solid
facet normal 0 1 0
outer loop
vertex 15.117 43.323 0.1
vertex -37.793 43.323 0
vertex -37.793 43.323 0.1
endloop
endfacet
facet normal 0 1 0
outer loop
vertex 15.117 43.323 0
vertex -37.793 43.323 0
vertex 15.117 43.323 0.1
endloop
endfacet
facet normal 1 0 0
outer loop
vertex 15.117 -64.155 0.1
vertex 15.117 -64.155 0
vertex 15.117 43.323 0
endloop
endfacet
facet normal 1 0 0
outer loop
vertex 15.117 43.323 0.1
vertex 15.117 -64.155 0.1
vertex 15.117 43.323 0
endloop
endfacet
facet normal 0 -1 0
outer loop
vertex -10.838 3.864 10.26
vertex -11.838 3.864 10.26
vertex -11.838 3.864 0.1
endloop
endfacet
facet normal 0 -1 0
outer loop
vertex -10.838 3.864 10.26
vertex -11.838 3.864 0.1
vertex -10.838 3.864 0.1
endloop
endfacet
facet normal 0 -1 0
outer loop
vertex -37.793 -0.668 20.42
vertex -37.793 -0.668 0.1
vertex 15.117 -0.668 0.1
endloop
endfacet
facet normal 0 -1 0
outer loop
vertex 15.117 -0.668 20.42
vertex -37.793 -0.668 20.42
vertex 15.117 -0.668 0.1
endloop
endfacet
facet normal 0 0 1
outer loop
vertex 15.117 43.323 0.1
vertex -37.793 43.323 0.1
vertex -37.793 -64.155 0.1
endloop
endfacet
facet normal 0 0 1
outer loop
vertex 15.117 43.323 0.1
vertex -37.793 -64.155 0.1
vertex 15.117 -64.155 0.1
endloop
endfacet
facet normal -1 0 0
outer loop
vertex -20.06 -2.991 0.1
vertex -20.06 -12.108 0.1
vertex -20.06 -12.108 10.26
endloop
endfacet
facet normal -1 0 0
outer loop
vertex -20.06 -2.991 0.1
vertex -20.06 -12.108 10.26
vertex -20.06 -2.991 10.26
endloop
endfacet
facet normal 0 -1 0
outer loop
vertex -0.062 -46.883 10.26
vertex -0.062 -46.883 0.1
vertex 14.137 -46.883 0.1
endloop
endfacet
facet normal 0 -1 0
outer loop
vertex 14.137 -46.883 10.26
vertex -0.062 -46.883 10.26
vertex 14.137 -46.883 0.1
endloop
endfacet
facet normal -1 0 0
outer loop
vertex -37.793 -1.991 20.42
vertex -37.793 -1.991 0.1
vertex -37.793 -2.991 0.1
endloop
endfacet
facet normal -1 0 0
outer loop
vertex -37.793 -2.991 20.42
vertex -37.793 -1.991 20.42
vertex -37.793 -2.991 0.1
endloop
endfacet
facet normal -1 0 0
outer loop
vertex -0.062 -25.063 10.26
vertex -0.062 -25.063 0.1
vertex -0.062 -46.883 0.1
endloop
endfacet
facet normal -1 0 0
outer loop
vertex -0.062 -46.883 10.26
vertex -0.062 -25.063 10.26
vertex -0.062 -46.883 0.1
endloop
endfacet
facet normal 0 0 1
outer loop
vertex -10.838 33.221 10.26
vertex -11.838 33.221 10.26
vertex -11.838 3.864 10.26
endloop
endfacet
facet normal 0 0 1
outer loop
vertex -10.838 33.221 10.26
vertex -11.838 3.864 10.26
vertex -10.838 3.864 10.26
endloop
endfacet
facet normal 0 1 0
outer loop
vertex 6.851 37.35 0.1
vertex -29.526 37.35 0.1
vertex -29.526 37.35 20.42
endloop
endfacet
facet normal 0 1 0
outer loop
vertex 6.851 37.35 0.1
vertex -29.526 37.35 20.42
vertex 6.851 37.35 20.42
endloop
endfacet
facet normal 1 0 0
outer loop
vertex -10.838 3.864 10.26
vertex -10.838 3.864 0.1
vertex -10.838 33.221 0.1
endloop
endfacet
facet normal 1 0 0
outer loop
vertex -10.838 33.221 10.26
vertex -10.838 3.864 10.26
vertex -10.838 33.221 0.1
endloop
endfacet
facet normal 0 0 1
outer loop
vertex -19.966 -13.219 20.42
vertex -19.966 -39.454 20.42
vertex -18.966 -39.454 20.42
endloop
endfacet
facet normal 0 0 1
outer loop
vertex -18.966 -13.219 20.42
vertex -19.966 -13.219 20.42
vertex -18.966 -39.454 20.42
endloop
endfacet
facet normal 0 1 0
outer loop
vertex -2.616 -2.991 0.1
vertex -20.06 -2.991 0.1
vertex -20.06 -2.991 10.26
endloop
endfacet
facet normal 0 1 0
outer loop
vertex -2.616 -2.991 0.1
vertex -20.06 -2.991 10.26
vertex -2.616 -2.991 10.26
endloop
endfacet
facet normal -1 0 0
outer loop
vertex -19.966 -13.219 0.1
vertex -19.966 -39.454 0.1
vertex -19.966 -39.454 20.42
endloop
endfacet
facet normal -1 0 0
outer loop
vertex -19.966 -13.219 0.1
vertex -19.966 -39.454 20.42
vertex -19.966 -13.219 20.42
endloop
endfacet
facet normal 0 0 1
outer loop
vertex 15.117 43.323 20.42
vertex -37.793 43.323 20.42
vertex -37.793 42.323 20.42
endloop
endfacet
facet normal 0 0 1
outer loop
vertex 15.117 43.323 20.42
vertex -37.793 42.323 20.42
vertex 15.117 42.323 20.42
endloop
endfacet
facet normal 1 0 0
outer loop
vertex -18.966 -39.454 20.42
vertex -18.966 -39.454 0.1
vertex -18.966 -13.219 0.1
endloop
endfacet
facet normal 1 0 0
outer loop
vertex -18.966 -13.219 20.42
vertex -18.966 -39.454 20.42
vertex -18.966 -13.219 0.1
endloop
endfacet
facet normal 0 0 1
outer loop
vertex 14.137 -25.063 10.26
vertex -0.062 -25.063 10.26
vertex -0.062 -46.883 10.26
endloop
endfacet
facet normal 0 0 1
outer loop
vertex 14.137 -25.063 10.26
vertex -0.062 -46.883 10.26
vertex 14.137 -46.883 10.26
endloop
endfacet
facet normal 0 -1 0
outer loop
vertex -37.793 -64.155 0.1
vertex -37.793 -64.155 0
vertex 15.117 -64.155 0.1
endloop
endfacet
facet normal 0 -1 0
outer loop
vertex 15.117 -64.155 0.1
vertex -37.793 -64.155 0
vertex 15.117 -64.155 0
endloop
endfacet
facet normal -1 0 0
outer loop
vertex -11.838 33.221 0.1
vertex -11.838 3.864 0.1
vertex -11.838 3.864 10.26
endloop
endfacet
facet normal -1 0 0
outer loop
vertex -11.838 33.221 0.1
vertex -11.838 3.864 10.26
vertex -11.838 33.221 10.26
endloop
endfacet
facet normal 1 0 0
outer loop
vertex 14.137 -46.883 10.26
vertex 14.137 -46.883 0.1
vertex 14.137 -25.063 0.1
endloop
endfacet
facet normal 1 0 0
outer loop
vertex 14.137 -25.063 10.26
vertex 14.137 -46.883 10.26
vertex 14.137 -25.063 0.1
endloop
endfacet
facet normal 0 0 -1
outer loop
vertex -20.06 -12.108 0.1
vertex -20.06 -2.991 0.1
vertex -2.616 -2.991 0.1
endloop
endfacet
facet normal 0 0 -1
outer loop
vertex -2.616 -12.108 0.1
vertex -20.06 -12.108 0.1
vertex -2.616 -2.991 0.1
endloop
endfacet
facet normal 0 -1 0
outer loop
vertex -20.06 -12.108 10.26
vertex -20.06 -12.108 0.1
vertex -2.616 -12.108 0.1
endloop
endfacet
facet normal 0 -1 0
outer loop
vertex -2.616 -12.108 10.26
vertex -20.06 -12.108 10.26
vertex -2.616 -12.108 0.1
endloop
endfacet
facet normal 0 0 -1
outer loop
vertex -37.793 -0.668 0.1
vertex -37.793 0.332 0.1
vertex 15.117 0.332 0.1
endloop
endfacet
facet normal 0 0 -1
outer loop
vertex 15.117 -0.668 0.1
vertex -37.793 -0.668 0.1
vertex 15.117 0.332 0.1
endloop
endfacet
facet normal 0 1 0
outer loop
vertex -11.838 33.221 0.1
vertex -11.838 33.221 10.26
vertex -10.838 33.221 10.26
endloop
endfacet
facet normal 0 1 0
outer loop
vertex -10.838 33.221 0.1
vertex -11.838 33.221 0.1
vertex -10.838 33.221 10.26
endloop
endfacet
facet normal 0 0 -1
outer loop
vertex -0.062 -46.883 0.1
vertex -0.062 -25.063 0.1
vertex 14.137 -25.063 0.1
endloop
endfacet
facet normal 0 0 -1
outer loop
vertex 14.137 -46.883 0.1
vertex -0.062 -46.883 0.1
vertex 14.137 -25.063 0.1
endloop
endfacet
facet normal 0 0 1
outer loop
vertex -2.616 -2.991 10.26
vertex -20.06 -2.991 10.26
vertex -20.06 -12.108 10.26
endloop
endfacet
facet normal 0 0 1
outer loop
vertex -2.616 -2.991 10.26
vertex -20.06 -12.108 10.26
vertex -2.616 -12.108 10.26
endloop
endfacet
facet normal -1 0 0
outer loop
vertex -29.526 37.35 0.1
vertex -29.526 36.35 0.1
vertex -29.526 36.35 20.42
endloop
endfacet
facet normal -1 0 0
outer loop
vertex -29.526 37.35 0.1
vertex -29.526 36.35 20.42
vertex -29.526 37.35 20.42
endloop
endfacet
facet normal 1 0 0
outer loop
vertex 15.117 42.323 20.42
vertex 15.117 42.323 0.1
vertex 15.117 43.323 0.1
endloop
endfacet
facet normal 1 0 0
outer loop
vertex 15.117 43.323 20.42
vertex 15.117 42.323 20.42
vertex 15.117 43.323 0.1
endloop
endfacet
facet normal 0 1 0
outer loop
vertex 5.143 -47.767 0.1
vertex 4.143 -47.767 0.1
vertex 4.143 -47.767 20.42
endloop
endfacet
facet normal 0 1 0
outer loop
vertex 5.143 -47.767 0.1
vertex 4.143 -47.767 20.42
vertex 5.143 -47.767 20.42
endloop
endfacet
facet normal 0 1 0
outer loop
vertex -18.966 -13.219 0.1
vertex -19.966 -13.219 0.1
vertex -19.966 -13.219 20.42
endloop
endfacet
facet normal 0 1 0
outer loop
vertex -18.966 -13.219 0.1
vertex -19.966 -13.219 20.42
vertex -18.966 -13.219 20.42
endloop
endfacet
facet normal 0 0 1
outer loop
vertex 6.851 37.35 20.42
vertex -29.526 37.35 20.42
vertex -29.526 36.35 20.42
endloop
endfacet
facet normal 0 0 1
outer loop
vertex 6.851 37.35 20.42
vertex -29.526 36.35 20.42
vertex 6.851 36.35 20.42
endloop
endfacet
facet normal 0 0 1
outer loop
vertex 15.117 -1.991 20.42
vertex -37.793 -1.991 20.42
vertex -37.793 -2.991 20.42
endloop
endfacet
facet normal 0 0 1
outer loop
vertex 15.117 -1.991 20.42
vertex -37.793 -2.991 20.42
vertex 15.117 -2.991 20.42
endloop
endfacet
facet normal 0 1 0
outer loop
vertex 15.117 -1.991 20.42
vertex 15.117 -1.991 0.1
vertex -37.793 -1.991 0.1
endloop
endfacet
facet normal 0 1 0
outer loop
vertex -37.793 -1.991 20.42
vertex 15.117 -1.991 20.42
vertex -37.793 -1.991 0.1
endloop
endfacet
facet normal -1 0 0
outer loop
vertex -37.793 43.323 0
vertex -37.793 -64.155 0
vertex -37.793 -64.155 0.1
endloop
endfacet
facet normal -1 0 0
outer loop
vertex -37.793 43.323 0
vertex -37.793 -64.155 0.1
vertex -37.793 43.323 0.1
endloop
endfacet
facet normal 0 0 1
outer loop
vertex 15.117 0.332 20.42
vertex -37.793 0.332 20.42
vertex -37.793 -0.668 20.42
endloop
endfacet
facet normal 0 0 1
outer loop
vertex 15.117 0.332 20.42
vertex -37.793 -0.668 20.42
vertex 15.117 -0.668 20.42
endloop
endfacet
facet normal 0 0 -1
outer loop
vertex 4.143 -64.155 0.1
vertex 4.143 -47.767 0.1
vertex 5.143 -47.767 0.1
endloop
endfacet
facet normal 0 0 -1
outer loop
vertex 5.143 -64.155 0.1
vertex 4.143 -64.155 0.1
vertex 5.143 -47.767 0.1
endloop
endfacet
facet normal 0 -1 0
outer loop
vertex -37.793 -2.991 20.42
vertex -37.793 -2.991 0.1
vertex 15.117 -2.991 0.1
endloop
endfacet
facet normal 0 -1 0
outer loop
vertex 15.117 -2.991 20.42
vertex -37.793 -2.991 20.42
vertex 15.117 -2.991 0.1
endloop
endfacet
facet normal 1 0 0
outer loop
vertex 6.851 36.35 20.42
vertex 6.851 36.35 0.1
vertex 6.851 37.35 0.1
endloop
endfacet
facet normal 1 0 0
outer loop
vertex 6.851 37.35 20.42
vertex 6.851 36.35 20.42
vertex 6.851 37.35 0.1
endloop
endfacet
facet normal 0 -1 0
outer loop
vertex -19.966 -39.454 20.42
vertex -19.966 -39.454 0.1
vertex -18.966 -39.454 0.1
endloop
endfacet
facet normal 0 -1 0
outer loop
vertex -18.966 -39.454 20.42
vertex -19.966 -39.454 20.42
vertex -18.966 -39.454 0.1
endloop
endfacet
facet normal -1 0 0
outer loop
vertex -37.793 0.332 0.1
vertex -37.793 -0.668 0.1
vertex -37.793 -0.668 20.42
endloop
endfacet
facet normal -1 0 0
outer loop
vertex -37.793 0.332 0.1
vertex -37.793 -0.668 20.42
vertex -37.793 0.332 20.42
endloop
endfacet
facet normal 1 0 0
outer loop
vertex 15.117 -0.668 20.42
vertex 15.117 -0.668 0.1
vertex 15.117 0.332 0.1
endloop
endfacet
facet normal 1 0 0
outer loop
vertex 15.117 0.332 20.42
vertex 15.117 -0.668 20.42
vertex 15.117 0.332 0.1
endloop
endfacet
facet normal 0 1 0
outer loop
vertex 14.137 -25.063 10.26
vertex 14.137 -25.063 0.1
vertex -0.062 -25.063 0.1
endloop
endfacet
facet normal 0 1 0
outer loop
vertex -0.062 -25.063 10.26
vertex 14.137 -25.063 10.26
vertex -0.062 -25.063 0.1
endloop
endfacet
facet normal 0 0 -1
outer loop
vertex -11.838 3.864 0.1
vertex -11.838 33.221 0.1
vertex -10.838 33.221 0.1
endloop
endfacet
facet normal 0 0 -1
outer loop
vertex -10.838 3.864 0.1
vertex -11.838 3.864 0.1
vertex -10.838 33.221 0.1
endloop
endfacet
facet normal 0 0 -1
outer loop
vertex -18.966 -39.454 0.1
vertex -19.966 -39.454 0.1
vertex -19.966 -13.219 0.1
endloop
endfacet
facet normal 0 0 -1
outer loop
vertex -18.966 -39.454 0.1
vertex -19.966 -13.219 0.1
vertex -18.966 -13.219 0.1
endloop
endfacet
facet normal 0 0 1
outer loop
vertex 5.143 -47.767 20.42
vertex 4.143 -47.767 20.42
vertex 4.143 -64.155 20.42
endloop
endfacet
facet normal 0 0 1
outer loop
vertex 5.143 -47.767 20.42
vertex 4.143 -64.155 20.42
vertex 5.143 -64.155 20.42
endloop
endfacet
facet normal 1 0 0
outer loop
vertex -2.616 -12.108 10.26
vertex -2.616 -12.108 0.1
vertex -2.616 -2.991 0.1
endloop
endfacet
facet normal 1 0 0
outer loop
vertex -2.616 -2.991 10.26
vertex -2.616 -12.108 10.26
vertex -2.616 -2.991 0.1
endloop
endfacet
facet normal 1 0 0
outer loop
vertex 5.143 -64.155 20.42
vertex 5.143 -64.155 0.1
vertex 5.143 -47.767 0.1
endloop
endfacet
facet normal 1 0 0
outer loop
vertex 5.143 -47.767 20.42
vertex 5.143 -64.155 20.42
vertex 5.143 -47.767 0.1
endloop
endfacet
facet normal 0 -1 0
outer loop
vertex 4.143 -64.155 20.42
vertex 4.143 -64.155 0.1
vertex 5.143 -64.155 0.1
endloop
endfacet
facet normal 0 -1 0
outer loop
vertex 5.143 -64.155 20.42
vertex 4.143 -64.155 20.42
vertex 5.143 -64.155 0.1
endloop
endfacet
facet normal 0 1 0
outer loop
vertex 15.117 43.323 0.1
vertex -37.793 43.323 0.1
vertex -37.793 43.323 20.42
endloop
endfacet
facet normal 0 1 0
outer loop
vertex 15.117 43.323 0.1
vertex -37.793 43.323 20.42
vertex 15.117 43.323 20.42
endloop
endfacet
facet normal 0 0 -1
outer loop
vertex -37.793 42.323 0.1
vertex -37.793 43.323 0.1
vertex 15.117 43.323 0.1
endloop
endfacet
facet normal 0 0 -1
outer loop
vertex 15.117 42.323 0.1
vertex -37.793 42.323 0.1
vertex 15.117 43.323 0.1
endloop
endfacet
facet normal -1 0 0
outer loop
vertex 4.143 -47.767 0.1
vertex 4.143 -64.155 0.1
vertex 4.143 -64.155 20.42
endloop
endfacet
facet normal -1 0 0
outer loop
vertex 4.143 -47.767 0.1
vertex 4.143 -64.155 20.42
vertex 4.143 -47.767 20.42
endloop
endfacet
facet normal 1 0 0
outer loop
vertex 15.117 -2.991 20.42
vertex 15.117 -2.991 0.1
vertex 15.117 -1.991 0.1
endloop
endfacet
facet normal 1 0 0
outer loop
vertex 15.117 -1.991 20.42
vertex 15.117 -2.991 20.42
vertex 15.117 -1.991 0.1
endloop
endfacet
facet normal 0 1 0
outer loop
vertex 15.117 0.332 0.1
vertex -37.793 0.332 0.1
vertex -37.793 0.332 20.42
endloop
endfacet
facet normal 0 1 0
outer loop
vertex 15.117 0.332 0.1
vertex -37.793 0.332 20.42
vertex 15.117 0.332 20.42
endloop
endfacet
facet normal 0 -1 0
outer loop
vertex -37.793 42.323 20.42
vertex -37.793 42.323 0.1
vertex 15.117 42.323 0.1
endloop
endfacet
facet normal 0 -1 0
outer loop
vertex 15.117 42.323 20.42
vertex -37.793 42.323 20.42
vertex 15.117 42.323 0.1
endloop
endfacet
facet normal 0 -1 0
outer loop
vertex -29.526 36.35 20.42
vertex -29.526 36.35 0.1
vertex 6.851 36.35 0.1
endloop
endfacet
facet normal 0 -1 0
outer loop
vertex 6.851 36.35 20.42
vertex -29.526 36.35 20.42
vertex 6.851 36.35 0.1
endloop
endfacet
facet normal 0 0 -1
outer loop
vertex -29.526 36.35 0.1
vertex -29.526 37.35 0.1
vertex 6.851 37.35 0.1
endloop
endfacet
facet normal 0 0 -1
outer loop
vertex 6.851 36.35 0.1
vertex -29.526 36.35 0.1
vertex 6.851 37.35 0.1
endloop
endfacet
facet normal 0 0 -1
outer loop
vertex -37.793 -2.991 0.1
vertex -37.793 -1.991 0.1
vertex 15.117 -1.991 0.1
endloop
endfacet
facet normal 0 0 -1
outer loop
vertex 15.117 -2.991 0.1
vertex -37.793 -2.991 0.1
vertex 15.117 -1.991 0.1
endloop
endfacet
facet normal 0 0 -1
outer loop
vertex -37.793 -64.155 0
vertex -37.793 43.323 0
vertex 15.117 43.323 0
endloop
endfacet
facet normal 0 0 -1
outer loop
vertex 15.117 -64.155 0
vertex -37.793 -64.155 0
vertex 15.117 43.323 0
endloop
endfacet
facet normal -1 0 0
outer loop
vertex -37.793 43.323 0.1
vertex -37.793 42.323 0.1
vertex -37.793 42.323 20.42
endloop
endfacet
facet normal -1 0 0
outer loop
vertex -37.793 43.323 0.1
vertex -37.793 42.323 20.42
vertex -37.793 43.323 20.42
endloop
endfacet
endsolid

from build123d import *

# Parameters (mm, degrees)
F0_W     = 52.9098408297
F0_H     = 107.4788756669
F1_DEPTH = 0.1
F2_W     = 52.9098408297
F2_H     = 1
F3_DEPTH = 20.32
F2_W_2   = 36.3767435774
F2_W_3   = 1
F2_H_2   = 26.2354757977
F2_H_3   = 16.3882337511
F2_H_4   = 29.3569701103
F4_DEPTH = 10.16
F2_W_4   = 17.4434864894
F2_H_5   = 9.1168937506


# Not quite as in the source:
# - a feature names something its author has since deleted; it is built from what else it names
# - the program builds the solid bodies; features that only make, move or delete a surface that nothing else refers to are left out


with BuildPart() as f1:
    # F0 (on Top) → F1 (new body)
    with BuildSketch(Plane.XY):
        with Locations((-11.3378218375, -10.4160513729)):
            Rectangle(F0_W, F0_H)
    extrude(amount=F1_DEPTH)


with BuildPart() as f3:
    # F2 (on face) → F3 (new body)
    with BuildSketch(Plane.XY.offset(0.1)):
        with Locations((-11.3378218375, 42.8233864605)):
            Rectangle(F2_W, F2_H)
    extrude(amount=F3_DEPTH)


with BuildPart() as f3b:
    # F2 (on face) → F3, piece 2 (new body)
    with BuildSketch(Plane.XY.offset(0.1)):
        with Locations((-11.3378218375, 36.850056529)):
            Rectangle(F2_W_2, F2_H)
    extrude(amount=F3_DEPTH)


with BuildPart() as f3c:
    # F2 (on face) → F3, piece 3 (new body)
    with BuildSketch(Plane.XY.offset(0.1)):
        Polygon((15.1170985773, -1.9911537422), (-37.7927422523, -1.9911537422), (-37.7927422523, -2.9911537422), (-20.0595650822, -2.9911537422), (-2.6160785928, -2.9911537422), (15.1170985773, -2.9911537422), align=None)
    extrude(amount=F3_DEPTH)


with BuildPart() as f3d:
    # F2 (on face) → F3, piece 4 (new body)
    with BuildSketch(Plane.XY.offset(0.1)):
        with Locations((-19.4659615755, -26.3364540243)):
            Rectangle(F2_W_3, F2_H_2)
    extrude(amount=F3_DEPTH)


with BuildPart() as f3e:
    # F2 (on face) → F3, piece 5 (new body)
    with BuildSketch(Plane.XY.offset(0.1)):
        with Locations((4.6426873542, -55.9613723308)):
            Rectangle(F2_W_3, F2_H_3)
    extrude(amount=F3_DEPTH)


with BuildPart() as f3f:
    # F2 (on face) → F3, piece 6 (new body)
    with BuildSketch(Plane.XY.offset(0.1)):
        with Locations((-11.3378218375, -0.1677915226)):
            Rectangle(F2_W, F2_H)
    extrude(amount=F3_DEPTH)


with BuildPart() as f4:
    # F2 (on face) → F4 (new body)
    with BuildSketch(Plane.XY.offset(0.1)):
        with Locations((-11.3378218375, 18.5424766348)):
            Rectangle(F2_W_3, F2_H_4)
    extrude(amount=F4_DEPTH)


with BuildPart() as f4b:
    # F2 (on face) → F4, piece 2 (new body)
    with BuildSketch(Plane.XY.offset(0.1)):
        with Locations((-11.3378218375, -7.5496006175)):
            Rectangle(F2_W_4, F2_H_5)
    extrude(amount=F4_DEPTH)


with BuildPart() as f4c:
    # F2 (on face) → F4, piece 3 (new body)
    with BuildSketch(Plane.XY.offset(0.1)):
        Polygon((14.1368384046, -25.0625275075), (2.9698581193, -25.0625275075), (-0.0619098573, -25.0625275075), (-0.0619098573, -46.8825139105), (14.1368384046, -46.8825139105), align=None)
    extrude(amount=F4_DEPTH)


solid = Compound([f1.part, f3.part, f3b.part, f3c.part, f3d.part, f3e.part, f3f.part, f4.part, f4b.part, f4c.part])
